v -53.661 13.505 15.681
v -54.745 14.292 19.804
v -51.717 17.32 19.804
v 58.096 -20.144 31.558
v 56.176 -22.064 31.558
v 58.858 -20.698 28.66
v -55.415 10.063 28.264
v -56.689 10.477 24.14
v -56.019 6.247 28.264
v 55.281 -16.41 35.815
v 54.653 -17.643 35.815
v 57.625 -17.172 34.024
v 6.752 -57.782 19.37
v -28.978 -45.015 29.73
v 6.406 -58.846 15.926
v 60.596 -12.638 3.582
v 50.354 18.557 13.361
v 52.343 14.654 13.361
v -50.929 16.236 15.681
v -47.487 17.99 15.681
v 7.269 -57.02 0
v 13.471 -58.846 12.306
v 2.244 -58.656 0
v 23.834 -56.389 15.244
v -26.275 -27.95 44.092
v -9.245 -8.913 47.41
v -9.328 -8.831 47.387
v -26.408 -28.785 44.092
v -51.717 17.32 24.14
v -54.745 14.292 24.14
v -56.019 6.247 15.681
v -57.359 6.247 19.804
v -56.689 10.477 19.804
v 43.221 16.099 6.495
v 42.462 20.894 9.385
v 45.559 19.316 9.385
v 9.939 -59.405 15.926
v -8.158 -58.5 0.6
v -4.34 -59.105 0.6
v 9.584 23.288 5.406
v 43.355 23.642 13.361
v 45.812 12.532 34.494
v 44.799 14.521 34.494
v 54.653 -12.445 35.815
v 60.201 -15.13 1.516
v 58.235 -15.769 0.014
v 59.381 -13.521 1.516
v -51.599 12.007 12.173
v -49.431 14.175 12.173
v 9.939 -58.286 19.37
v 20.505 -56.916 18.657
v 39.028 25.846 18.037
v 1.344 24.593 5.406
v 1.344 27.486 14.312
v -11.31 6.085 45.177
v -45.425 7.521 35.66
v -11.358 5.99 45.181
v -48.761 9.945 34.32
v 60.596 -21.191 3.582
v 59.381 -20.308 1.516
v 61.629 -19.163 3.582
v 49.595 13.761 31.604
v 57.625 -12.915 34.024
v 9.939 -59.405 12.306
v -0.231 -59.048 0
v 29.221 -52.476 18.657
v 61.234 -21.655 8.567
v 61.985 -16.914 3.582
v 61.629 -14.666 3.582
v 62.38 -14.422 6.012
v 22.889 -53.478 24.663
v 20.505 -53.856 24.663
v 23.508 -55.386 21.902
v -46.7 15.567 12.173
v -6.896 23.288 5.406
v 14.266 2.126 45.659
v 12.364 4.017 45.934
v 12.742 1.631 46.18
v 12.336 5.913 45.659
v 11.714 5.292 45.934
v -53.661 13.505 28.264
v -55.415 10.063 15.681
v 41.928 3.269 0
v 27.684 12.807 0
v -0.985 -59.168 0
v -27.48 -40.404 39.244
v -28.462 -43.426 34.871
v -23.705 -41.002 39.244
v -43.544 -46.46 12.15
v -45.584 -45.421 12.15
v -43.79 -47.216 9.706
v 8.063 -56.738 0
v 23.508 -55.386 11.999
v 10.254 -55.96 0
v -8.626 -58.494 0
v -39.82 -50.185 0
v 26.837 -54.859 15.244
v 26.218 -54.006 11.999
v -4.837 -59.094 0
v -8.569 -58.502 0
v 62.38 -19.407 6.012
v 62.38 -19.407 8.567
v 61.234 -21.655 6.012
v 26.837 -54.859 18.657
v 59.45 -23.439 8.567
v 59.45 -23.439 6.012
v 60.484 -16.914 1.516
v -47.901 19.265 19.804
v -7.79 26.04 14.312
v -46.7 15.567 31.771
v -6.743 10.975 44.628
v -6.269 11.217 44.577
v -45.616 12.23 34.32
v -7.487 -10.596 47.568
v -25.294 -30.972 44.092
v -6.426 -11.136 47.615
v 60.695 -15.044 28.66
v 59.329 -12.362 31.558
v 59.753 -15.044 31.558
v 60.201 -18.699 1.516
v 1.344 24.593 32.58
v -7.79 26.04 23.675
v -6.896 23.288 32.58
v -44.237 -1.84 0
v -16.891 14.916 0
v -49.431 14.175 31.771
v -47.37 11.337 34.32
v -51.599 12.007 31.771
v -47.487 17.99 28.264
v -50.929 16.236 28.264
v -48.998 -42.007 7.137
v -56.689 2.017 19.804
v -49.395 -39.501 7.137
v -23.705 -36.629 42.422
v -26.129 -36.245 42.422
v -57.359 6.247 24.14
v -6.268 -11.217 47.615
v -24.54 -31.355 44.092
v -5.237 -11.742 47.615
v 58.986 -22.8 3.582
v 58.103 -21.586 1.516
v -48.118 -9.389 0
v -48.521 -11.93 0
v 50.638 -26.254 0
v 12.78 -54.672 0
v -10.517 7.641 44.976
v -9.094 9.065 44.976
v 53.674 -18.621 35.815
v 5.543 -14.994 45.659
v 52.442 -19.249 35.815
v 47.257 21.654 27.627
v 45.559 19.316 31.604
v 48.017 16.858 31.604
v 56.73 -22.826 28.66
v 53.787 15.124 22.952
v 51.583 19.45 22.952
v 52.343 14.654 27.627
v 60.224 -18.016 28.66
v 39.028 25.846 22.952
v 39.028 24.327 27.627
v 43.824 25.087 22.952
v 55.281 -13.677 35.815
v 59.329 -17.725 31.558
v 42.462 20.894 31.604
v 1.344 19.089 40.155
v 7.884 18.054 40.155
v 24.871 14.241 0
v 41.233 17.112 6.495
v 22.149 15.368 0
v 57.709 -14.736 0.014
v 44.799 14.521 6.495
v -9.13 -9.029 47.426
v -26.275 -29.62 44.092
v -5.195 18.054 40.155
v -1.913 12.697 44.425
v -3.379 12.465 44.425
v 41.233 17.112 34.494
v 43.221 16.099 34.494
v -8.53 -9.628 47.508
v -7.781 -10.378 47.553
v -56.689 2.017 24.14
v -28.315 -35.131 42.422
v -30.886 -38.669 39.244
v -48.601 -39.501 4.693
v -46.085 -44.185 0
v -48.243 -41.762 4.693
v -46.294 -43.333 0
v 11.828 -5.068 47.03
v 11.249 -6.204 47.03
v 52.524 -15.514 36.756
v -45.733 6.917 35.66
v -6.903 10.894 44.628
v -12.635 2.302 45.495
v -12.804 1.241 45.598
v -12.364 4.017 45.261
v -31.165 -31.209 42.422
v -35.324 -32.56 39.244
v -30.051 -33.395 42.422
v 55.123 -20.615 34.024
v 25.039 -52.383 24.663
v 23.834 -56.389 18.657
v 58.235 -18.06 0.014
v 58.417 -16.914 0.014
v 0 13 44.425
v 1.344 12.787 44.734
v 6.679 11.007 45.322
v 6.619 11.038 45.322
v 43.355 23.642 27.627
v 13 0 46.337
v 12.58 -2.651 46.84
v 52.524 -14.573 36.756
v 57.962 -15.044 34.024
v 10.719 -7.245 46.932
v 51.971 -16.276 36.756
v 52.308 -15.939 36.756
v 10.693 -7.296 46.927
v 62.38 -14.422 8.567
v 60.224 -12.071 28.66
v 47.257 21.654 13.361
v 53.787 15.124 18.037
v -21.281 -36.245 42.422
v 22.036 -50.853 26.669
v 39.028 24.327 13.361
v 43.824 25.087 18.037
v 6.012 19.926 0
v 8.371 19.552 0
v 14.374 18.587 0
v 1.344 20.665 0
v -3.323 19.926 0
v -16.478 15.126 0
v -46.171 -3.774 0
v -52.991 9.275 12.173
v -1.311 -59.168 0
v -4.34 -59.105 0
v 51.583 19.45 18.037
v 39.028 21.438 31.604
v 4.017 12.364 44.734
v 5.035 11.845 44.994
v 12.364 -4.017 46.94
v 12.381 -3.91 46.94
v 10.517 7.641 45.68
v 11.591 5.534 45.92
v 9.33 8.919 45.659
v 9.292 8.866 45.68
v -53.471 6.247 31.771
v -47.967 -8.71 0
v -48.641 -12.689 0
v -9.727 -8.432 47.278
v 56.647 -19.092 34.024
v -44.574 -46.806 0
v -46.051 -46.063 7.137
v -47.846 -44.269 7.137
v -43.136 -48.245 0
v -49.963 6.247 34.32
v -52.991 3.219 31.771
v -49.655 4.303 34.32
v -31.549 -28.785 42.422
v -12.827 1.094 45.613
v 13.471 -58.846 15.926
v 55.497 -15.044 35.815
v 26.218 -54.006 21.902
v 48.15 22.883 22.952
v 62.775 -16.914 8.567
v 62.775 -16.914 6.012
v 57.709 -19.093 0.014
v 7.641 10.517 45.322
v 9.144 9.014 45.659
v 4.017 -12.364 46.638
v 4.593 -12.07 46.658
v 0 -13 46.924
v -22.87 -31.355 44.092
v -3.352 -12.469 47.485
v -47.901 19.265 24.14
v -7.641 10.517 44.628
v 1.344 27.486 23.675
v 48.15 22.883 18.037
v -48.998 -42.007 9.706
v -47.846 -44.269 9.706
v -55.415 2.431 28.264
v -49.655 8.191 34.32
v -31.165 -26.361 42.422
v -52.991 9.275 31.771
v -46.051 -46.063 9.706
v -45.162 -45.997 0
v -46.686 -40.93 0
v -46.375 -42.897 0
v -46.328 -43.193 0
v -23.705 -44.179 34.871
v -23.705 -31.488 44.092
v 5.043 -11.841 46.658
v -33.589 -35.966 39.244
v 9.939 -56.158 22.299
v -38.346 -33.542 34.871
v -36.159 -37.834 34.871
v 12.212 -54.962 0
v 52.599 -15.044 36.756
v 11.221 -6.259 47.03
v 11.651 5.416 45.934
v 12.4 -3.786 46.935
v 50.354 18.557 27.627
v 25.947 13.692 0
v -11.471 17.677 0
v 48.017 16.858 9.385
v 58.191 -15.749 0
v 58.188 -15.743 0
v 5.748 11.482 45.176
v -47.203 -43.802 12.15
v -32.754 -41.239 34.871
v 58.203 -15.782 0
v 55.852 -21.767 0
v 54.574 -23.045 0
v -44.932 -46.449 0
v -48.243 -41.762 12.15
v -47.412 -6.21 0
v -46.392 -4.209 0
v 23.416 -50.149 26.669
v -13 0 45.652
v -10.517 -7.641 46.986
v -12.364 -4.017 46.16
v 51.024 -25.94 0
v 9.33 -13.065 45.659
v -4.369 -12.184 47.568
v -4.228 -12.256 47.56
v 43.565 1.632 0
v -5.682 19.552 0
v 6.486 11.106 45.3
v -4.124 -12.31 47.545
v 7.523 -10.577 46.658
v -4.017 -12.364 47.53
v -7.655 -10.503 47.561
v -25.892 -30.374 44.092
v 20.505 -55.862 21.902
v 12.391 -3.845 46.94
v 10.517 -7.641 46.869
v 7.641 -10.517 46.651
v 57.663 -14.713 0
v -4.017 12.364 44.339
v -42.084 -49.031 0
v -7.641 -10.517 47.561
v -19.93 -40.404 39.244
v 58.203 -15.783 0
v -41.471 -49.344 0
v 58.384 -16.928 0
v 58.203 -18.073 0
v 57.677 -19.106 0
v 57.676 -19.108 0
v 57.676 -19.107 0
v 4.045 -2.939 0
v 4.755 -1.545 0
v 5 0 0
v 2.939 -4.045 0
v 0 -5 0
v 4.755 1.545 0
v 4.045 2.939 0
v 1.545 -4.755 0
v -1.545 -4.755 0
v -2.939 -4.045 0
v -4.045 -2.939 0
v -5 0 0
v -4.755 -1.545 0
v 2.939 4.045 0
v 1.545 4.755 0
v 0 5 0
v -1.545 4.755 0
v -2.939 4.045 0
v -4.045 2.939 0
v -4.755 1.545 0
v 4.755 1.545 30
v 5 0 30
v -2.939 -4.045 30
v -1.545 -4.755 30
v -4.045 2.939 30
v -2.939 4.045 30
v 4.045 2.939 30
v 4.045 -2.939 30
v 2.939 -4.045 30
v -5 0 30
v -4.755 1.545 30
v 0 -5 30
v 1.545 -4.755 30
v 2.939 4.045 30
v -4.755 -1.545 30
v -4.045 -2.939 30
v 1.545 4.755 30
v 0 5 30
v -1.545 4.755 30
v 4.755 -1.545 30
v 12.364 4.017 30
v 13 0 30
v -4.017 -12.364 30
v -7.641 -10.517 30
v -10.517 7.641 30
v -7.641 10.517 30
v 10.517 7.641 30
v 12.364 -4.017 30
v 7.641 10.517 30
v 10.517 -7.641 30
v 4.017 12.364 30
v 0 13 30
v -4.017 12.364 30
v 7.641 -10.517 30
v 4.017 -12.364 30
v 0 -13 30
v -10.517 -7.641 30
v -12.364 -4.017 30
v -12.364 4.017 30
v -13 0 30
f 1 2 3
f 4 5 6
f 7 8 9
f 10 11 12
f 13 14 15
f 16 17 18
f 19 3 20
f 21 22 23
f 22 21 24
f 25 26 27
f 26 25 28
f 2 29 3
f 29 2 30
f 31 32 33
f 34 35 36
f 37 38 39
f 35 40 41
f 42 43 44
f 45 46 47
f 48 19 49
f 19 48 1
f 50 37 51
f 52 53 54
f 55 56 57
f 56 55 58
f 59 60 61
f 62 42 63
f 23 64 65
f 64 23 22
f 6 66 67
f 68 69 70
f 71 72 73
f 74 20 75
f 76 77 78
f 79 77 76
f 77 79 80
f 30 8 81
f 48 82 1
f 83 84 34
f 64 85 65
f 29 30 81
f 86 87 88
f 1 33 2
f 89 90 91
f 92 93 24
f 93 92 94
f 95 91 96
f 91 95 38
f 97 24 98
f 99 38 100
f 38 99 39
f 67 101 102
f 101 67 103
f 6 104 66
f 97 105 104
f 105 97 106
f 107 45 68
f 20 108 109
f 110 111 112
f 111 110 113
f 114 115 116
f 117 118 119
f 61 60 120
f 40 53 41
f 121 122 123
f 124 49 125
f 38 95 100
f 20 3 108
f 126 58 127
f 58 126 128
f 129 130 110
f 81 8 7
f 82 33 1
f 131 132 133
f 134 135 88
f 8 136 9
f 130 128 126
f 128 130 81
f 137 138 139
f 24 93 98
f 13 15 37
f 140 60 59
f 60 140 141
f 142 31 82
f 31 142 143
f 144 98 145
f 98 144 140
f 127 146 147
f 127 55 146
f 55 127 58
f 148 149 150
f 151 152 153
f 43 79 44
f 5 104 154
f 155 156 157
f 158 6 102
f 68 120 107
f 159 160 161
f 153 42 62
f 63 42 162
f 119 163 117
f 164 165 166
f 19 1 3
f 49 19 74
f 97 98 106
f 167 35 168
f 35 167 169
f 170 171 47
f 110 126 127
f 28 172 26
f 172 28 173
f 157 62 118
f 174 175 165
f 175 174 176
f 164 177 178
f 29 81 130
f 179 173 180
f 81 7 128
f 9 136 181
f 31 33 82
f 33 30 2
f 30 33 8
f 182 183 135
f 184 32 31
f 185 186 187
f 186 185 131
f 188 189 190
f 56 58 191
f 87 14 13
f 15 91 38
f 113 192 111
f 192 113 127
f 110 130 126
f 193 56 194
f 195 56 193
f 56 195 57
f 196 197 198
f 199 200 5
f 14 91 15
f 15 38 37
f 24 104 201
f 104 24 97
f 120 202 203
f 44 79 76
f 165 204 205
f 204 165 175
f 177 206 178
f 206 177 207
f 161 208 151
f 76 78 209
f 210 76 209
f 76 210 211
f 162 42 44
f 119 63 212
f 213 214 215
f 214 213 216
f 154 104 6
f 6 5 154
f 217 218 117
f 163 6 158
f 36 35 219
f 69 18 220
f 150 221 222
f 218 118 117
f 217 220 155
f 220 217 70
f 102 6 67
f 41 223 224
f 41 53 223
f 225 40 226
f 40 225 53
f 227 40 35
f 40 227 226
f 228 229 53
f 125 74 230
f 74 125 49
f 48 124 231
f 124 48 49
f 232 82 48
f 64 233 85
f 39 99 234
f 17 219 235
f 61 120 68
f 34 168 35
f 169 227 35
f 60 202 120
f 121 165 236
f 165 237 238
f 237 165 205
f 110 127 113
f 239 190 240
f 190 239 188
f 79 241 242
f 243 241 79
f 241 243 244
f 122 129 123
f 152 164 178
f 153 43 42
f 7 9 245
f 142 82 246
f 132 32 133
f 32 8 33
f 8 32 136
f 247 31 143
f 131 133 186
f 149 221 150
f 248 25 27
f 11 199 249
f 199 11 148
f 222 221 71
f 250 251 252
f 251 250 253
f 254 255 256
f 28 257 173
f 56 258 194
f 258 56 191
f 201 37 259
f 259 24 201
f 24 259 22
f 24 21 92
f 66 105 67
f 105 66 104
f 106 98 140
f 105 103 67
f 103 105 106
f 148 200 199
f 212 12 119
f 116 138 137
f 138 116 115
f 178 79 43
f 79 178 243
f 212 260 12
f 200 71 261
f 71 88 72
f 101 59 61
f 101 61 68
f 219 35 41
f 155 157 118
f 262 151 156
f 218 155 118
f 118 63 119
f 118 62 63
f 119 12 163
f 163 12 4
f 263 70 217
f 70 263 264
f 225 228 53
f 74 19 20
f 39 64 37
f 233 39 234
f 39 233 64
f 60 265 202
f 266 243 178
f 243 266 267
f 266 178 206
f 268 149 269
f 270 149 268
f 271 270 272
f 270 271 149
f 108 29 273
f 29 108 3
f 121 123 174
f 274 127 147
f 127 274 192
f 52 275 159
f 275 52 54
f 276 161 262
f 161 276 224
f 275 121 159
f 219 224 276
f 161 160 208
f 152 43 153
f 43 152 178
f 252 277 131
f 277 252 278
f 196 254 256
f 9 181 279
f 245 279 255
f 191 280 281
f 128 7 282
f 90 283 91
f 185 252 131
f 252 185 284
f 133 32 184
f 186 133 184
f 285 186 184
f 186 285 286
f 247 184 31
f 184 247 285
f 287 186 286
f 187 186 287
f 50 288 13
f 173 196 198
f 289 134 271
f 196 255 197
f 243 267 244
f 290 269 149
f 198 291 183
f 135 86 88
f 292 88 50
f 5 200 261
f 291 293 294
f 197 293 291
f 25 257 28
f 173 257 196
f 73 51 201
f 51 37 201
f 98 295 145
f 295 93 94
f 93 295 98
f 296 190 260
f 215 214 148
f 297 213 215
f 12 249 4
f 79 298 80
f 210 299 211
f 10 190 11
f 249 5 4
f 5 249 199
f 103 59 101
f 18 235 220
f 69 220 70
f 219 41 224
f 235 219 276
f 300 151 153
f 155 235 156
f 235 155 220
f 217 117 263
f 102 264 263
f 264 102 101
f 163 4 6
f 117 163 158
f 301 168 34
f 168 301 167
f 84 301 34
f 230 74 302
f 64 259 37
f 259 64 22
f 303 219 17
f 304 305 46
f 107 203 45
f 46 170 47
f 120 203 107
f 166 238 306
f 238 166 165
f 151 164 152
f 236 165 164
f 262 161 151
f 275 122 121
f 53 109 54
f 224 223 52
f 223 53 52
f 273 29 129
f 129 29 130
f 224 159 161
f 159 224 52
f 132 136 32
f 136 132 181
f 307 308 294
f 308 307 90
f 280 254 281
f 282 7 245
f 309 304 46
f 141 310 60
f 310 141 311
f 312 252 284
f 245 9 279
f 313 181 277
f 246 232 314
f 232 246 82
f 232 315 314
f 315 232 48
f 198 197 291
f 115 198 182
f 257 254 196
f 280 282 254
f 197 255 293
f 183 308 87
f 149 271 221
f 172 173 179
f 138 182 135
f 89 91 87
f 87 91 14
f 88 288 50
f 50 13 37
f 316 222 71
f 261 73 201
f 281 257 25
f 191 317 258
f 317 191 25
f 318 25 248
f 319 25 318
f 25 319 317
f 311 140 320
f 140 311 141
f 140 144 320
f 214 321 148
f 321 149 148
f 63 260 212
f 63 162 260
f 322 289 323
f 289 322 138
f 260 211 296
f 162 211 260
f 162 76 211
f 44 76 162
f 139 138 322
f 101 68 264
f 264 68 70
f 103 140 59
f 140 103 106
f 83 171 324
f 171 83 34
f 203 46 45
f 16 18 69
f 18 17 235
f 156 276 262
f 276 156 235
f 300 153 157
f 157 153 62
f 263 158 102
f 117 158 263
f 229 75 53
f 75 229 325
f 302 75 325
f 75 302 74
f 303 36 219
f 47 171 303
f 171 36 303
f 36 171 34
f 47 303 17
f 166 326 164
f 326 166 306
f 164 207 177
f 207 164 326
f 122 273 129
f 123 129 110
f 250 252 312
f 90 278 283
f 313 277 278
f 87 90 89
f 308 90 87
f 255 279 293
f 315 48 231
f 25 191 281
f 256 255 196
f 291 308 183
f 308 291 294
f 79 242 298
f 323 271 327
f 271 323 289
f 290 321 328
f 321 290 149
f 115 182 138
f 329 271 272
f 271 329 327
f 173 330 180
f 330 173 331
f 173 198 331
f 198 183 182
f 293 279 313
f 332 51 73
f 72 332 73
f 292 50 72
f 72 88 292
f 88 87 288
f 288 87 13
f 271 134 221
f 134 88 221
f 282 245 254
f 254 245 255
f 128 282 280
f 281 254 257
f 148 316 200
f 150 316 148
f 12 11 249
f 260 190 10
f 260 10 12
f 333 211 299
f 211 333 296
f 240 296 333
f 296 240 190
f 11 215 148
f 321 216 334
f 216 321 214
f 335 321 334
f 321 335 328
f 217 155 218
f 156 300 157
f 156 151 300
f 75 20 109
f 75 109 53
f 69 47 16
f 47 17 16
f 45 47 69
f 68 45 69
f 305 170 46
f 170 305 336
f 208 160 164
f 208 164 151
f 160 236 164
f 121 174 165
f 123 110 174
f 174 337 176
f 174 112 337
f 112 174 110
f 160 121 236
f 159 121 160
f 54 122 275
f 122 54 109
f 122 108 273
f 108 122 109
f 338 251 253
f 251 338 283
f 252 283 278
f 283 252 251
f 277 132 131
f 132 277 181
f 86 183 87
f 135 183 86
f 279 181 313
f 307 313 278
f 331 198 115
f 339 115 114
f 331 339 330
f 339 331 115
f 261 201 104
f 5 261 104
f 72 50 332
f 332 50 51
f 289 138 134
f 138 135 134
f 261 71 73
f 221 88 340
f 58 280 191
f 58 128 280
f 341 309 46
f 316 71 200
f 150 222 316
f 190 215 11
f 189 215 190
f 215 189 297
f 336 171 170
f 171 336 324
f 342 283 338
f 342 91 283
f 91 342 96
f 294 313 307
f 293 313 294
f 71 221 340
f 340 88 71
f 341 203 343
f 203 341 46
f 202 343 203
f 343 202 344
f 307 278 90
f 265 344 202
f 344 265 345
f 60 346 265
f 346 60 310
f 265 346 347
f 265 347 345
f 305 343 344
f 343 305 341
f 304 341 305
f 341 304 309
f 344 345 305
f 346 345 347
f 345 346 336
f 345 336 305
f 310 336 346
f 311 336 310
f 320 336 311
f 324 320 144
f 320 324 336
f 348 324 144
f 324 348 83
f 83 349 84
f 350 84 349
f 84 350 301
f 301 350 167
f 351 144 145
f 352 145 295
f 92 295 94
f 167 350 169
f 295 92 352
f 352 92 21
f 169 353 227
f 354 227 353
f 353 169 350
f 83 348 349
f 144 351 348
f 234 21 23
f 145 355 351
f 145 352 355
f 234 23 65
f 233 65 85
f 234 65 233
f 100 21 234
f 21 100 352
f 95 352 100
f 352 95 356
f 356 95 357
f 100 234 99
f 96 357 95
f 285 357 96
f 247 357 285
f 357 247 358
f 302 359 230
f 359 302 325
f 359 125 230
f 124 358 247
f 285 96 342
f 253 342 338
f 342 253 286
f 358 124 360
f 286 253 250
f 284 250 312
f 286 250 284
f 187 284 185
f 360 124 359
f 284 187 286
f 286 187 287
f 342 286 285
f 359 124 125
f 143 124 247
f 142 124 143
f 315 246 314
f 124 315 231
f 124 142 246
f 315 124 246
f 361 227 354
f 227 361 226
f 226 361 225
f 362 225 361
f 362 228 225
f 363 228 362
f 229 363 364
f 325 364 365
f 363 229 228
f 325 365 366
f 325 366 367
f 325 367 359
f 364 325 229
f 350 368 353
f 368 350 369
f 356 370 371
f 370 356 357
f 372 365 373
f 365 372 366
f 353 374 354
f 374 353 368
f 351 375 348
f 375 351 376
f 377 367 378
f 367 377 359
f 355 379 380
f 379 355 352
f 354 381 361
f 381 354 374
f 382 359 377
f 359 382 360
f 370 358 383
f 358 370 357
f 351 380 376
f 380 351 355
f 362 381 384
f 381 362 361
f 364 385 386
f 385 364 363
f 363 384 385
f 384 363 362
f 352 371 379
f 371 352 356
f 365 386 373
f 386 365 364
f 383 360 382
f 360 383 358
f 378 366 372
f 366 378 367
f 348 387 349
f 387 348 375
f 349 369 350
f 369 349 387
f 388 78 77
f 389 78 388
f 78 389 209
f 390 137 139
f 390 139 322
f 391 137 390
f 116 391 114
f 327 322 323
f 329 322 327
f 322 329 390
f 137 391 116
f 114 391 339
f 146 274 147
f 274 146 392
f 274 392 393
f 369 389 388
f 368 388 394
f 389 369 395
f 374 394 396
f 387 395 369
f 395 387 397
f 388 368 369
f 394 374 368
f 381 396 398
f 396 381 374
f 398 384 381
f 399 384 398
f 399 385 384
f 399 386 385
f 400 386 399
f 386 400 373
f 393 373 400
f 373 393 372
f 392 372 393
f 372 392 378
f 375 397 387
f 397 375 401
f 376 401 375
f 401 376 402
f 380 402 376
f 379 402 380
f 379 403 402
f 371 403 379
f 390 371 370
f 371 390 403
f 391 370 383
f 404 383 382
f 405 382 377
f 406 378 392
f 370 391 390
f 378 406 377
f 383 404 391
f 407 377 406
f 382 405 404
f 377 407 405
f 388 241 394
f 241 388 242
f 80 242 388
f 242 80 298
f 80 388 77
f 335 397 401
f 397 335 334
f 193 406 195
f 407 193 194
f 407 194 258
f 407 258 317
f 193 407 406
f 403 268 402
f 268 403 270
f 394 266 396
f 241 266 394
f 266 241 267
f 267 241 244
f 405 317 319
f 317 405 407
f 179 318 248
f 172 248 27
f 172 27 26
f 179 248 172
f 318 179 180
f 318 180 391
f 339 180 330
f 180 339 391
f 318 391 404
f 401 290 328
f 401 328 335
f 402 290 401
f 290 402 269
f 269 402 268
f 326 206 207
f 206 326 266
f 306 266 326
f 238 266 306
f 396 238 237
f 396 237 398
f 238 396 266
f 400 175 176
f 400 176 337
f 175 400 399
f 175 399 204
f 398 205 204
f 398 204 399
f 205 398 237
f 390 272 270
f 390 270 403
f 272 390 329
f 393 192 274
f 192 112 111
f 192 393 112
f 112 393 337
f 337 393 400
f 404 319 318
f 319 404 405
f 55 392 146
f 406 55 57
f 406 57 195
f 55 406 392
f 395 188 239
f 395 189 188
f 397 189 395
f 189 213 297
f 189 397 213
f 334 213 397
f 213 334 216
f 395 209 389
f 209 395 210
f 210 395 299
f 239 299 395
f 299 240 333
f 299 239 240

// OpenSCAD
//Customizable Rock Climbing Hold v1.2
//v1 had 125 views and 11 downloads
//v1.1 had 16 views and 4 downloads
//Created by Ari M. Diacou, October 2014
//Shared under Creative Commons License: Attribution-ShareAlike 3.0 Unported (CC BY-SA 3.0) 
//see http://creativecommons.org/licenses/by-sa/3.0/

// preview[view:north west, tilt:top diagonal]

//Maximum(ish) size of hold in mm
Dmax=120;
//Changes hold thickness based on climb difficulty
difficulty=5.7;//[5.4,5.5,5.6,5.7,5.8,5.9,"5.10"]
//A way to save your random arrangement
seed=20;
//Diameter of the socket wrench you will tighten your bolt with in mm
head_diameter=26;
//Diameter of the hole that the bolt will fit into in mm
bore_diameter=10;
//number of spheres
n=12;
//Parameter for scaling of element sizes (smaller makes spikier rocks)
a=7;//[1:10]
//Changes curviness of rocks ($fn= 4 or 20) and adds an uncut reference rock
testing_mode=false;

                 /*[Hidden]*/

///////////////// Variables ///////////////////////
Rmax=Dmax/2;
vector=rands(0,1,3*n,seed);
//Figures how thin to make the hold based on the desired difficulty of the route
z_adjustment = (difficulty=="5.10" || difficulty-5.1<.04) ? 
	-0.4 :
	(difficulty-5.7)*(-4/3);
//Use lower resolution in testing mode for speed
$fn= testing_mode ? 4 : 20;

///////////////////Main()/////////////////////////
hold(vector);

//A bunch of other testing/debugging options
if(testing_mode){
	//Reference copy, uncomment to see whole rock
	translate([3*Rmax,0,0]) rock(vector);
	translate([3*Rmax,0,0]) show_space();
	echo(str("For difficulty of ",difficulty," the z adjustment is: ",z_adjustment));
	}

/////////////////Functions///////////////////////
module hold(vector_of_n_random_triplets){
	difference(){
		translate([0,0,Rmax*z_adjustment])
			rock(vector_of_n_random_triplets);
		//Remove the bottom to give a flat base
		translate([0,0,-Rmax*1.5]) 
			cube(Rmax*3,center=true);
		//Drill a hole for the bolt
		cylinder(r=bore_diameter/2,h=4*Rmax,center=true,$fn=20);
		//Counter-sink for the bolt head
		translate([0,0,Rmax*(0.5+z_adjustment)]) //0.68 is an average because I cant 
			if(testing_mode){
				#cylinder(r=head_diameter/2,h=Rmax,$fn=20);}
			else{
				cylinder(r=head_diameter/2,h=Rmax,$fn=20);}
		}
	}

module rock(vector_of_n_random_triplets){
	v=vector_of_n_random_triplets;
	hull(){
		for(i=[0:n-1]){ //For each i, pass a triplet to module element()
			element([v[i],v[i+1],v[i+2]]);
			}
		}
	}

module element(v){
	//Sets up a sphere of radius R randomly placed in a cylinder
	//a triplet of random [0,1] numbers are converted to a cylindrical triplet
	//the cylinder has a radius of Rmax, and a height of Rmax

	//Coordinates of a sphere in cylindrical coordinates
	r=Rmax*v[0]; 
	theta=360*v[1]; 
	z=(v[2]-0.5)*Rmax;
	//But OpenSCAD thinks in cartesian
	y=r*sin(theta);
	x=r*cos(theta);
	/*We have to wrap/hull() all of these spheres to make a rock. To make it aesthetically convincing, spheres at the edges of the allowed range should be smaller than those placed towards the center. I chose a gaussian distribution of sphere radius as a function of r/Rmax, which is simply v[0]. */
	R=.5*Rmax*exp(-v[0]*v[0]/(a/10));
	translate([x,y,z]) sphere(R);
	}

module show_space(){ 
	//makes a transparent highlighted cylinder spanning the space that
	//element()s can be placed in.
	%# cylinder(2*Rmax,r=Rmax,center=true, $fn=40);
	}
